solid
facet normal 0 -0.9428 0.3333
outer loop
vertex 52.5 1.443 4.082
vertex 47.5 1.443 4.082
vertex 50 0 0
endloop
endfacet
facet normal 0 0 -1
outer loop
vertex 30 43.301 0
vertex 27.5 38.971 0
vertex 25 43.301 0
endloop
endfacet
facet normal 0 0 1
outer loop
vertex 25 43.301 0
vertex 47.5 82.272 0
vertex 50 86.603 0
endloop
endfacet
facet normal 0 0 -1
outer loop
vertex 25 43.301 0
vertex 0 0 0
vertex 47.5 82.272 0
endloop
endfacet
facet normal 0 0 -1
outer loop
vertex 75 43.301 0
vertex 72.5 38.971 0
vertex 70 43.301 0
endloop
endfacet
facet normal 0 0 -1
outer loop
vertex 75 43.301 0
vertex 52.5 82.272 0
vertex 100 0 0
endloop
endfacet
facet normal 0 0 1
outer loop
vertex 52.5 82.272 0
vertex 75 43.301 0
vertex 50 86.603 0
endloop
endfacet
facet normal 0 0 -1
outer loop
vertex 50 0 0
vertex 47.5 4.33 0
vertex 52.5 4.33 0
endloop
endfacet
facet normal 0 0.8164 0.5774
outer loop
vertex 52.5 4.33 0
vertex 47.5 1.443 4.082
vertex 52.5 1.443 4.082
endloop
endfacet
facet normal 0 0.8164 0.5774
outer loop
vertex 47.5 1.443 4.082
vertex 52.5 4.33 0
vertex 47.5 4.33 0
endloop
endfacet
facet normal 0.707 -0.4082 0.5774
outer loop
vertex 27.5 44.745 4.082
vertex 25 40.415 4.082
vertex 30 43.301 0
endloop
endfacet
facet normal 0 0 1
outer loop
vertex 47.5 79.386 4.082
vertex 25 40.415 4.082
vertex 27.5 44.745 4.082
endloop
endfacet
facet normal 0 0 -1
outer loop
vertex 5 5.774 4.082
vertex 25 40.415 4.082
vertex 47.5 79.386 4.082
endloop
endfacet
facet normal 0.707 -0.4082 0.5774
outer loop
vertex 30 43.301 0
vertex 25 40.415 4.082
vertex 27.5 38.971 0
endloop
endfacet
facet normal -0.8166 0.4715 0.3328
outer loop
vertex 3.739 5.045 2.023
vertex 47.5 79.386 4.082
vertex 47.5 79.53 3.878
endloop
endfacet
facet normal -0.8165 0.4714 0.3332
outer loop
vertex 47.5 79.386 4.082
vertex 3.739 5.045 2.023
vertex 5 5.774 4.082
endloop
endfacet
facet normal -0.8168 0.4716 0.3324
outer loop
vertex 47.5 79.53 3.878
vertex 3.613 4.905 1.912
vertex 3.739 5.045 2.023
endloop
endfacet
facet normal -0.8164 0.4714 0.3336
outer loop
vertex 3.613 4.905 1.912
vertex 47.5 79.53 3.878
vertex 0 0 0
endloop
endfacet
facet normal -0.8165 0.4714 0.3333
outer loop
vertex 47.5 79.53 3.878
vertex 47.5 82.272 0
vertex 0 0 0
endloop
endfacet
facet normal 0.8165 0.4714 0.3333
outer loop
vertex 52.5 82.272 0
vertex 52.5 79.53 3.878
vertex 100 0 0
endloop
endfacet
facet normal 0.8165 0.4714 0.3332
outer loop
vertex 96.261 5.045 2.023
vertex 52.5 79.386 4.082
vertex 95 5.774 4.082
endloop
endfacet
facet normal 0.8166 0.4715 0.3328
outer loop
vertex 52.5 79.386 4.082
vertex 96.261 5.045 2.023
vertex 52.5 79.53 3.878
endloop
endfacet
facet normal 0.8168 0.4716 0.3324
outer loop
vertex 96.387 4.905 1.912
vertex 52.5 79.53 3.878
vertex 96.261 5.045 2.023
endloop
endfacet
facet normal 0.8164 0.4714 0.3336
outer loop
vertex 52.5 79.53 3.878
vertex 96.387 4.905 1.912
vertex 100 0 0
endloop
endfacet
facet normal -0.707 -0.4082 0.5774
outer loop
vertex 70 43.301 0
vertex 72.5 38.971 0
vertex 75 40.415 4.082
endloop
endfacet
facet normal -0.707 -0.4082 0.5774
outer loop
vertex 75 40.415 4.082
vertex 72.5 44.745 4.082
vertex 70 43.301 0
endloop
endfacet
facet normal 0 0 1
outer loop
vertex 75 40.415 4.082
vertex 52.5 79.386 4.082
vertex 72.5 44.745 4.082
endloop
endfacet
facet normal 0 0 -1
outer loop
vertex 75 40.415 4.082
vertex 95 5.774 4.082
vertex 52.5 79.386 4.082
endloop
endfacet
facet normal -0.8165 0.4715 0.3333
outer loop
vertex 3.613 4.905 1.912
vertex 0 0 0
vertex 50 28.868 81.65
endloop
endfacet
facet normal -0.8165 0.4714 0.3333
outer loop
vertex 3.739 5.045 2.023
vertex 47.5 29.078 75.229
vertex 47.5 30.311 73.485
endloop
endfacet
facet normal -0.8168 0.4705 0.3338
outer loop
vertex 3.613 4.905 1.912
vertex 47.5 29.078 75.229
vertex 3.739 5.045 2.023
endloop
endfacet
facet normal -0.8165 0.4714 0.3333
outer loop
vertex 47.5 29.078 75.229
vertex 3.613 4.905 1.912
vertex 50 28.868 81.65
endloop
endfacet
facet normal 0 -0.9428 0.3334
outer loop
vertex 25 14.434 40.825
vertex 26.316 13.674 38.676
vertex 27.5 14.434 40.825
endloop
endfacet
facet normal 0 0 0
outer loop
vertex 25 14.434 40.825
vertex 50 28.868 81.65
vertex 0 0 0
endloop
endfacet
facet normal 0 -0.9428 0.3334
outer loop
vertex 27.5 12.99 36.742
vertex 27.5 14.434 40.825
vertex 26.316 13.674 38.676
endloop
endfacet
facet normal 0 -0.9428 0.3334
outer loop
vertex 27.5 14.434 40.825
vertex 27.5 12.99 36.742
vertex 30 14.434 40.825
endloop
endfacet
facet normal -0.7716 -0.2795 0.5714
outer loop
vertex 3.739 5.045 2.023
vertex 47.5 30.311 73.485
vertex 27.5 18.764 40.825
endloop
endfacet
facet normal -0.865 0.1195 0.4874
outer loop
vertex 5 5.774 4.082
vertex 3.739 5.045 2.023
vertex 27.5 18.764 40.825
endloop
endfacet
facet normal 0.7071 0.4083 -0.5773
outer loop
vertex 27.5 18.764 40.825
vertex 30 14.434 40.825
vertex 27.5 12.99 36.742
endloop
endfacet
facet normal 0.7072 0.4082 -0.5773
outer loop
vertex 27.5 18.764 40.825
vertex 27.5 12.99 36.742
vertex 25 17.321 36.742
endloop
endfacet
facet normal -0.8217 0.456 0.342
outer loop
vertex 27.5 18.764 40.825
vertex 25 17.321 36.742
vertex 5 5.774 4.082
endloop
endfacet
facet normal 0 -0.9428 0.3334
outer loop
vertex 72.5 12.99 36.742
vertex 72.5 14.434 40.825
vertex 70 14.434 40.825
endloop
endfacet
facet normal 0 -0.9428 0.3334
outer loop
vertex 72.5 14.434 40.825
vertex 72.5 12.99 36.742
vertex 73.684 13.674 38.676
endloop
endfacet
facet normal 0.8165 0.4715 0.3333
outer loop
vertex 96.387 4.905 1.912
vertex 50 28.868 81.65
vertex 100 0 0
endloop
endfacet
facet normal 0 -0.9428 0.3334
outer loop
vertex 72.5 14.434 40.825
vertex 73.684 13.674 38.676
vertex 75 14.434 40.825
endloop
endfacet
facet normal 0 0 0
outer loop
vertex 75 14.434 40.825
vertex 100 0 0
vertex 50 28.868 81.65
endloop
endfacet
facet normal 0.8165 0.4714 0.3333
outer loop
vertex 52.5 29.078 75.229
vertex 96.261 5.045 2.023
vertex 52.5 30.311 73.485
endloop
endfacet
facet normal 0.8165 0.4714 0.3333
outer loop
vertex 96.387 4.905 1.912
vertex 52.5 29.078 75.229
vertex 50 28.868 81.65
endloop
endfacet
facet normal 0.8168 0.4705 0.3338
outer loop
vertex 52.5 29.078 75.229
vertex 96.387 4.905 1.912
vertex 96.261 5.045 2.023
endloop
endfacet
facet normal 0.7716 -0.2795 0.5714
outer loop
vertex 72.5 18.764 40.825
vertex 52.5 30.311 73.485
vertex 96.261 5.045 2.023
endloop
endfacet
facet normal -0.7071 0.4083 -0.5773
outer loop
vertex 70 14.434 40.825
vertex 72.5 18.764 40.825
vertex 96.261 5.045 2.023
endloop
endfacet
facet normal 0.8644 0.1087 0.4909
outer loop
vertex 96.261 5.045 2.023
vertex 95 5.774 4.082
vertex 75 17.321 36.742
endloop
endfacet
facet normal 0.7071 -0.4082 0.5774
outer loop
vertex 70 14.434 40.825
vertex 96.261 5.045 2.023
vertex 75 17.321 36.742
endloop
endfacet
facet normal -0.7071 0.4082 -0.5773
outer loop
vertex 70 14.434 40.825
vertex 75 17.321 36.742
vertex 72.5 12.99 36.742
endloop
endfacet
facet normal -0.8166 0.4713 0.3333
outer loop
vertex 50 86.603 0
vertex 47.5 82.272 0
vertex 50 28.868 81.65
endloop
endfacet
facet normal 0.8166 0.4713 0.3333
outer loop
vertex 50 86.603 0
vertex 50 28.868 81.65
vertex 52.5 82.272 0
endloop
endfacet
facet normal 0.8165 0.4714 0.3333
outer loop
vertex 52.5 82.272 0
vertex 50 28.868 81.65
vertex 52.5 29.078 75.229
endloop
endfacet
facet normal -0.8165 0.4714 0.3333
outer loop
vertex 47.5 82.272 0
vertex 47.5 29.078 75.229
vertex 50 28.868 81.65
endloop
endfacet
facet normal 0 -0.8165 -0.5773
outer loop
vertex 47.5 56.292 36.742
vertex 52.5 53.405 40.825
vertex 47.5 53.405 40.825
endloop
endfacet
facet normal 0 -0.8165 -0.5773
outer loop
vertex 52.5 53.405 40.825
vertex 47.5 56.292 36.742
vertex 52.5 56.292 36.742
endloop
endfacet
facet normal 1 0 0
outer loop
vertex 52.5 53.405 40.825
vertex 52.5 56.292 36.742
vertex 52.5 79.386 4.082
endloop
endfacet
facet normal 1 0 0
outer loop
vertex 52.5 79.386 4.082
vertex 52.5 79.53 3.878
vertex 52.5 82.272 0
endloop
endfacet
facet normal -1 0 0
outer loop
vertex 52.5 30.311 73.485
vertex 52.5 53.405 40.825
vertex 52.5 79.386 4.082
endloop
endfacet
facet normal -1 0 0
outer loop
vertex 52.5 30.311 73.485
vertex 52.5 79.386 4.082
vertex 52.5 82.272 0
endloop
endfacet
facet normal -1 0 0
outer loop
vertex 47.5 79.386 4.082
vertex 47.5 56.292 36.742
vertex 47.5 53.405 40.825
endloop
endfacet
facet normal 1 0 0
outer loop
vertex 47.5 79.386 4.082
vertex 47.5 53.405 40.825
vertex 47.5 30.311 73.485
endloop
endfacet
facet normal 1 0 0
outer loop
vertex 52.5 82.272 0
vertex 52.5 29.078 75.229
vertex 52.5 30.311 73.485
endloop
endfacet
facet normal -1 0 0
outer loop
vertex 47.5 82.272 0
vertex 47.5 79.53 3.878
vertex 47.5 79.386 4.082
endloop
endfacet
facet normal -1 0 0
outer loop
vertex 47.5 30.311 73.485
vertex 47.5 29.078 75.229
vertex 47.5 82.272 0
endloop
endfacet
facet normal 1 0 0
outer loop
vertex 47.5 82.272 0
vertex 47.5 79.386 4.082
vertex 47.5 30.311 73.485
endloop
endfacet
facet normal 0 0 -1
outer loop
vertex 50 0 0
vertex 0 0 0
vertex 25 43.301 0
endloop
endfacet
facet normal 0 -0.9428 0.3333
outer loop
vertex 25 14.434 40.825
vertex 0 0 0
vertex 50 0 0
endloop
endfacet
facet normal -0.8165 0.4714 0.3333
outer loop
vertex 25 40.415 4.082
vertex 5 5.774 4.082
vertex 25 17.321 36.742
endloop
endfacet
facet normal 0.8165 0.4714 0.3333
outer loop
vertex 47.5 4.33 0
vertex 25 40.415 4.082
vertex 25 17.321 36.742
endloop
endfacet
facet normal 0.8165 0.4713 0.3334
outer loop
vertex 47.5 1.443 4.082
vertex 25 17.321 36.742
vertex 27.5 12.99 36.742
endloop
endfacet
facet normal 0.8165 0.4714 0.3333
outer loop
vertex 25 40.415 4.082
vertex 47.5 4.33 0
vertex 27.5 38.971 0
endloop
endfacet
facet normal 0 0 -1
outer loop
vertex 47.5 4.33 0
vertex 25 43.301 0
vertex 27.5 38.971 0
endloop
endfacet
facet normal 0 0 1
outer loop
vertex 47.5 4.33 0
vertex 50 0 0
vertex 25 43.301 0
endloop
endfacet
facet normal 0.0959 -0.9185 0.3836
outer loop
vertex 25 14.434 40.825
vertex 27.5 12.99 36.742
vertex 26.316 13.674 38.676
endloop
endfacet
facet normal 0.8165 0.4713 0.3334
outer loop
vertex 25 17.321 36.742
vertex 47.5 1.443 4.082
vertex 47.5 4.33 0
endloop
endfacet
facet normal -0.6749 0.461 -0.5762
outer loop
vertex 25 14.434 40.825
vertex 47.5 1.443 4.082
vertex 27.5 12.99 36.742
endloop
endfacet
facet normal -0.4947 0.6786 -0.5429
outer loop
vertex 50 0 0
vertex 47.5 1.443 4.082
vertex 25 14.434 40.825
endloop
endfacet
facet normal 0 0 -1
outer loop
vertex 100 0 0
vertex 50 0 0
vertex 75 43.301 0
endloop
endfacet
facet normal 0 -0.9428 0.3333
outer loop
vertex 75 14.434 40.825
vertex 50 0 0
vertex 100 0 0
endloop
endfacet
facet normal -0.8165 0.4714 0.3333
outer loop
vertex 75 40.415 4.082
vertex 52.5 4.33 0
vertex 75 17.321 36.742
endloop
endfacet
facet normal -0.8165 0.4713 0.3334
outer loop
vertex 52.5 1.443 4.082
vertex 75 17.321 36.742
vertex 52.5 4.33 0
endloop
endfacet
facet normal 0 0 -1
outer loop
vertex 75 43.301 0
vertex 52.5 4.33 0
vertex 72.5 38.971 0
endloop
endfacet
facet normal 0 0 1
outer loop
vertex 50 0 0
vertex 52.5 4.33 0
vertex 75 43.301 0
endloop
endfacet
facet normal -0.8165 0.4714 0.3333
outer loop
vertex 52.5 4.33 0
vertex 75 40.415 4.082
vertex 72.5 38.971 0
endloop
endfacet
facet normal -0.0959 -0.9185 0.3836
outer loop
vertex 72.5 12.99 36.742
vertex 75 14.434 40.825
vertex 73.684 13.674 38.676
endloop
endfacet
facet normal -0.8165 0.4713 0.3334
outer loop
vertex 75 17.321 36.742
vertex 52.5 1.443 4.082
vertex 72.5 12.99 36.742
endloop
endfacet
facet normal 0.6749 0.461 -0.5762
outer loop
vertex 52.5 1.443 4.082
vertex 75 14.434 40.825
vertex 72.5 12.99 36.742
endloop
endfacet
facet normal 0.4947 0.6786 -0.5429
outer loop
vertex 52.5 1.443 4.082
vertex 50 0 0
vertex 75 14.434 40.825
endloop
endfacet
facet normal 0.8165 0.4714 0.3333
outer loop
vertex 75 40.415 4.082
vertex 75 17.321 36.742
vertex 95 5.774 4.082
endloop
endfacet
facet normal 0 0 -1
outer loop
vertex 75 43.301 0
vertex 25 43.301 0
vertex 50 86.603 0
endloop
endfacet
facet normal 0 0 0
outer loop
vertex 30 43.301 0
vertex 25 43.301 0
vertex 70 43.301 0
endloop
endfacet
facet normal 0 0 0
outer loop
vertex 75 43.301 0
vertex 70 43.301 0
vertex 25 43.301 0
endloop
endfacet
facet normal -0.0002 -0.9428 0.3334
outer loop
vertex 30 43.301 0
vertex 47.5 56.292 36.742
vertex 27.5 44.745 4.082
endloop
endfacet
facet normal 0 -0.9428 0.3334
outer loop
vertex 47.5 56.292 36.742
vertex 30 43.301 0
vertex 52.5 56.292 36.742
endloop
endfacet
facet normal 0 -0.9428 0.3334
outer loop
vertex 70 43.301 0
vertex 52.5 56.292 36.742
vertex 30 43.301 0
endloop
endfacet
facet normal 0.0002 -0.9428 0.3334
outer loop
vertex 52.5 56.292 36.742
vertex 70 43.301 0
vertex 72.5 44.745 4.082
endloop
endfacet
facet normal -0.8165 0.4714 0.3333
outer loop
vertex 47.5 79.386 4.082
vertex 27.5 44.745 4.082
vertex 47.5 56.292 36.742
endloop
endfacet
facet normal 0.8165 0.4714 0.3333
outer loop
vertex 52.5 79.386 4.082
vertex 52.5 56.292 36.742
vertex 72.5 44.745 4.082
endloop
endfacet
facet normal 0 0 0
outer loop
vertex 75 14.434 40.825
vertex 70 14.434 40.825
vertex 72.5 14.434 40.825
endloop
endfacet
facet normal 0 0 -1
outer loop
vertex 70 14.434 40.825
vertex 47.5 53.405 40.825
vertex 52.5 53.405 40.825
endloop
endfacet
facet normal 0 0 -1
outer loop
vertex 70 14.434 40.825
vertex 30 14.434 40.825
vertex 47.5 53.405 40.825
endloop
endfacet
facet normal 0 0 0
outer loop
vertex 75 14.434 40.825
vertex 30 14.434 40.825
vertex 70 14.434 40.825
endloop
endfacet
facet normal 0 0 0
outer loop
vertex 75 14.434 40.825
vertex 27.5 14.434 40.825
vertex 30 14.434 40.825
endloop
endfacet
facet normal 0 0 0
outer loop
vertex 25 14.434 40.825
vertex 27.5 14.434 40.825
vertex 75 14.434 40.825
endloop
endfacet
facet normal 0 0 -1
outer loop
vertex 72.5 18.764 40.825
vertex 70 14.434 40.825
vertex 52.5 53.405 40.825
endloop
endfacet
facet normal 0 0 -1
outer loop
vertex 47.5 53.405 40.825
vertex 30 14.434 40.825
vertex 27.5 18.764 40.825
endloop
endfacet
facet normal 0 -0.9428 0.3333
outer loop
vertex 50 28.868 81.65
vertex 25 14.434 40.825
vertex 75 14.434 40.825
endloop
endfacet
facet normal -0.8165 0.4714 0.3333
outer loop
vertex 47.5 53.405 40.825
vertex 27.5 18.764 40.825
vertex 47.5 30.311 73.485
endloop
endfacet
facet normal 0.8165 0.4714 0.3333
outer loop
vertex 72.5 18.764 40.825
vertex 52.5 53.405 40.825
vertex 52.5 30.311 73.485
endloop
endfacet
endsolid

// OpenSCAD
// Copyright(c) 2019 Norbert Schulz
//
// Permission is hereby granted, free of charge, to any person obtaining a
// copy of this software and associated documentation files (the "Software"),
// to deal in the Software without restriction, including without limitation
// the rights to use, copy, modify, merge, publish, distribute, sublicense,
// and/or sell copies of the Software, and to permit persons to whom the
// Software is furnished to do so, subject to the following conditions:
//
// The above copyright notice and this permission notice shall be included in
// all copies or substantial portions of the Software.
//
// THE SOFTWARE IS PROVIDED "AS IS", WITHOUT WARRANTY OF ANY KIND, EXPRESS OR
// IMPLIED, INCLUDING BUT NOT LIMITED TO THE WARRANTIES OF MERCHANTABILITY,
// FITNESS FOR A PARTICULAR PURPOSE AND NONINFRINGEMENT. IN NO EVENT SHALL
// THE AUTHORS OR COPYRIGHT HOLDERS BE LIABLE FOR ANY CLAIM, DAMAGES OR OTHER
// LIABILITY, WHETHER IN AN ACTION OF CONTRACT, TORT OR OTHERWISE, ARISING
// FROM, OUT OF OR IN CONNECTION WITH THE SOFTWARE OR THE USE OR OTHER
// DEALINGS IN THE SOFTWARE.

// A 3D-Triforce that looks like a triangular pyramid
// Developed with OpenSCAD 15.03-2 http://www.openscad.org/
//

// Parameters
//
edge_length = 100.0;            // distance from corner to corner
frame_width = 5.0;              // frame thickness
frame_standout = 0.0;           // standout the frame, try same as frame_width

// ------------------Helper functions ----------------------------------------

// Height of tetrahedron
//
function tetrahedron_height(size) = sqrt(6.0) * size / 3.0;

// height of equilateral triangle
//
function equilateral_triangle_height(size) = sqrt(3.0) * size / 2.0;

// center point based of tetrahedron
//
function tetrahedron_center(size) =
    [
        size / 2.0,
        sqrt(12) * size / 12.0,
        sqrt(12) * size / 12.0
    ];

// tetrahedron corners:
// p0-p1-p2 build an equilateral triangle with
//  p0: in origin
//  p1: on x-axis,
//  p2: inside quadrant I
//
// p3 = in z-dimension over center
//
function tetrahedron_corners(size) =
    [
       [ 0.0, 0.0, 0.0 ],
       [ size, 0.0, 0.0 ],
       [ tetrahedron_center(size)[0], equilateral_triangle_height(size) , 0.0 ],
       [ tetrahedron_center(size)[0], tetrahedron_center(size)[1], tetrahedron_height(size) ],
    ];


// Distance between 2 points
//
function dist(p1,p2) = sqrt(pow(p2[0]-p1[0],2) + pow(p2[1]- p1[1],2) +pow(p2[2]-p1[2],2));


// ------------------Module section  -----------------------------------------


// Tetrahedron is a 3 sided pyramid made from equilateral triangles.
//
module tetrahedron(size = 100)
{
    // polyhedron faces spawn by the given corners
    connections =
        [
            [ 0, 1, 2 ],    // bottom
            [ 0, 2, 3 ],    // left
            [ 1, 2, 3 ],    // right
            [ 0, 1, 3 ]     // front
        ];

    hull() polyhedron( points = tetrahedron_corners(size), faces = connections);
}

// Build a tetrahedron frame to generate solid joints between the triforce parts
// The frame is build by placing small tetrahedrons with hull width in each
// corner and then join the the convex hulls of each line together.
// By setting standout you can make the fame stick out of the triangles.
// This gives the triforce a nicer 3D look, but makes it a lot harder to print
// as no even surfaces exists anymore that can be put onto the build plate.
//
module tetrahedron_frame(size=100, width = 2.0, standout = 0.0)
{
    corner = tetrahedron_corners(size);
    corner_standout = tetrahedron_corners(size + standout);

    frame_height = tetrahedron_height(width);

    union() {

        hull() { // P0->P1
            translate(tetrahedron_center(size) * -1.0)
            translate(
                [corner[0][0],
                 corner[0][1],
                 corner[0][2]])
            {
                tetrahedron(size = width);
            }
            translate(tetrahedron_center(size) * -1.0)
            translate(
                [corner[1][0] - width,
                 corner[1][1],
                 corner[1][2]])
            {
                tetrahedron(size = width);
            }

            translate(tetrahedron_center(size + standout) * -1.0)
            translate(
                [corner_standout[0][0],
                 corner_standout[0][1],
                 corner_standout[0][2]])
            {
                tetrahedron(size = width);
            }
            translate(tetrahedron_center(size + standout) * -1.0)
            translate(
                [corner_standout[1][0] - width,
                 corner_standout[1][1],
                 corner_standout[1][2]])
            {
                tetrahedron(size = width);
            }

        }

        hull() { // P0->P2
            translate(tetrahedron_center(size) * -1.0)
            translate(
                [corner[0][0],
                 corner[0][1],
                 corner[0][2]])
            {
                tetrahedron(size = width);
            }
            translate(tetrahedron_center(size) * -1.0)
            translate(
                [corner[2][0] - width / 2.0,
                 corner[2][1] - equilateral_triangle_height(width),
                 0.0])
            {
                tetrahedron(size =width);
            }
            translate(tetrahedron_center(size + standout) * -1.0)
            translate(
                [corner_standout[0][0],
                 corner_standout[0][1],
                 corner_standout[0][2]])
            {
                tetrahedron(size = width);
            }
            translate(tetrahedron_center(size + standout) * -1.0)
            translate(
                [corner_standout[2][0] - width / 2.0,
                 corner_standout[2][1] - equilateral_triangle_height(width),
                 0.0])
            {
                tetrahedron(size =width);
            }
        }

        hull() { // P1->P2
            translate(tetrahedron_center(size) * -1.0)
            translate(
                [corner[1][0]- width,
                 corner[1][1],
                 corner[1][2]])
            {
                tetrahedron(size = width);
            }
            translate(tetrahedron_center(size) * -1.0)
            translate(
                [corner[2][0] - width / 2.0,
                 corner[2][1] - equilateral_triangle_height(width),
                 corner[2][2]])
            {
                tetrahedron(size = width);
            }
            translate(tetrahedron_center(size + standout) * -1.0)
            translate(
                [corner_standout[1][0]- width,
                 corner_standout[1][1],
                 corner_standout[1][2]])
            {
                tetrahedron(size = width);
            }
            translate(tetrahedron_center(size + standout) * -1.0)
            translate(
                [corner_standout[2][0] - width / 2.0,
                 corner_standout[2][1] - equilateral_triangle_height(width),
                 corner_standout[2][2]])
            {
                tetrahedron(size = width);
            }
        }

        hull() { // P0->P3
            translate(tetrahedron_center(size) * -1.0)
            translate(
                [corner[0][0],
                 corner[0][1],
                 corner[0][2]])
            {
               tetrahedron(size = width);
            }
            translate(tetrahedron_center(size) * -1.0)
            translate(
                [corner[3][0] - tetrahedron_center(width)[0],
                 corner[3][1] - tetrahedron_center(width)[1],
                 corner[3][2] - frame_height])
            {
                tetrahedron(size = width);
            }
            translate(tetrahedron_center(size + standout) * -1.0)
            translate(
                [corner_standout[0][0],
                 corner_standout[0][1],
                 corner_standout[0][2]])
            {
               tetrahedron(size = width);
            }
            translate(tetrahedron_center(size + standout) * -1.0)
            translate(
                [corner_standout[3][0] - tetrahedron_center(width)[0],
                 corner_standout[3][1] - tetrahedron_center(width)[1],
                 corner_standout[3][2] - frame_height])
            {
                tetrahedron(size = width);
            }
        }

        hull() { // P1->P3
            translate(tetrahedron_center(size) * -1.0)
            translate(
                [corner[1][0] - width,
                 corner[1][1],
                 corner[1][2]])
            {
                tetrahedron(size = width);
            }
            translate(tetrahedron_center(size) * -1.0)
            translate(
                [corner[3][0] - tetrahedron_center(width)[0],
                 corner[3][1] - tetrahedron_center(width)[1],
                 corner[3][2] - frame_height])
            {
                tetrahedron(size=width);
            }
            translate(tetrahedron_center(size + standout) * -1.0)
            translate(
                [corner_standout[1][0] - width,
                 corner_standout[1][1],
                 corner_standout[1][2]])
            {
                tetrahedron(size = width);
            }
            translate(tetrahedron_center(size + standout) * -1.0)
            translate(
                [corner_standout[3][0] - tetrahedron_center(width)[0],
                 corner_standout[3][1] - tetrahedron_center(width)[1],
                 corner_standout[3][2] - frame_height])
            {
                tetrahedron(size=width);
            }
        }

        hull() { // P2->P3
            translate(tetrahedron_center(size) * -1.0)
            translate(
                [corner[2][0] - width / 2.0,
                 corner[2][1] - equilateral_triangle_height(width),
                 corner[2][2]])
            {
                tetrahedron(size=width);
            }
            translate(tetrahedron_center(size) * -1.0)
            translate(
                [corner[3][0] - tetrahedron_center(width)[0],
                 corner[3][1] - tetrahedron_center(width)[1],
                 corner[3][2] - frame_height])
            {
                tetrahedron(size = width);
            }
            translate(tetrahedron_center(size + standout) * -1.0)
            translate(
                [corner_standout[2][0] - width / 2.0,
                 corner_standout[2][1] - equilateral_triangle_height(width),
                 corner_standout[2][2]])
            {
                tetrahedron(size=width);
            }
            translate(tetrahedron_center(size + standout) * -1.0)
            translate(
                [corner_standout[3][0] - tetrahedron_center(width)[0],
                 corner_standout[3][1] - tetrahedron_center(width)[1],
                 corner_standout[3][2] - frame_height])
            {
                tetrahedron(size = width);
            }
        }
    }
}

// build the triforce
//
module triforce(length, fwidth, fextra = 0.0)
{
    translate(tetrahedron_center(length+fextra))
    union() {

        // frame structure
        tetrahedron_frame(size = length, width = fwidth, standout=fextra);

        // triangles
        translate(tetrahedron_center(length) * -1.0)
        union() {
            // bottom 3 triangles
            tetrahedron(size = length / 2.0);
            translate(
                [corner[1][0] - length / 2.0 - fextra,
                 corner[1][1],
                 0.0])
            {
                tetrahedron(size = length / 2);
            }

            translate(
                [corner[0][0] + length / 4.0,
                 equilateral_triangle_height(length / 2.0),
                 0.0])
            {
                tetrahedron(size=length / 2);
            }

            // top one
            translate(
                [corner[0][0] + length / 4.0,
                 tetrahedron_center(length / 2.0)[1],
                 tetrahedron_height(length / 2,0)])
            {
                tetrahedron(size = length / 2.0);
            }
        }
    }
}

echo ("Triforce dimensions :");
corner = tetrahedron_corners(edge_length);
echo("p0=", corner[0]);
echo("p1=", corner[1]);
echo("p2=", corner[2]);
echo("p3=", corner[3]);

echo("p0->p1", dist(corner[0], corner[1]));
echo("p1->p2", dist(corner[1], corner[2]));
echo("p2->p0", dist(corner[2], corner[0]));

echo("p0->p3", dist(corner[0], corner[3]));
echo("p1->p3", dist(corner[1], corner[3]));
echo("p2->p3", dist(corner[2], corner[3]));

if (frame_standout != 0.0)
{
    // if we standout the frame, turn the tri-force to have on edge in X-axis
    // direction. Then print with supports.
    // Recommend Cura settings for supports are:
    // Support Placement: Everywhere, Support Overhang Angle: 40
    // Support Pattern Concentric
    //
    rotate( [ atan(sqrt(2)), 0.0, 0.0])
    triforce(length = edge_length - frame_standout, fwidth = frame_width, fextra = frame_standout);
} else {
    triforce(length = edge_length, fwidth = frame_width, fextra = frame_standout);
}
